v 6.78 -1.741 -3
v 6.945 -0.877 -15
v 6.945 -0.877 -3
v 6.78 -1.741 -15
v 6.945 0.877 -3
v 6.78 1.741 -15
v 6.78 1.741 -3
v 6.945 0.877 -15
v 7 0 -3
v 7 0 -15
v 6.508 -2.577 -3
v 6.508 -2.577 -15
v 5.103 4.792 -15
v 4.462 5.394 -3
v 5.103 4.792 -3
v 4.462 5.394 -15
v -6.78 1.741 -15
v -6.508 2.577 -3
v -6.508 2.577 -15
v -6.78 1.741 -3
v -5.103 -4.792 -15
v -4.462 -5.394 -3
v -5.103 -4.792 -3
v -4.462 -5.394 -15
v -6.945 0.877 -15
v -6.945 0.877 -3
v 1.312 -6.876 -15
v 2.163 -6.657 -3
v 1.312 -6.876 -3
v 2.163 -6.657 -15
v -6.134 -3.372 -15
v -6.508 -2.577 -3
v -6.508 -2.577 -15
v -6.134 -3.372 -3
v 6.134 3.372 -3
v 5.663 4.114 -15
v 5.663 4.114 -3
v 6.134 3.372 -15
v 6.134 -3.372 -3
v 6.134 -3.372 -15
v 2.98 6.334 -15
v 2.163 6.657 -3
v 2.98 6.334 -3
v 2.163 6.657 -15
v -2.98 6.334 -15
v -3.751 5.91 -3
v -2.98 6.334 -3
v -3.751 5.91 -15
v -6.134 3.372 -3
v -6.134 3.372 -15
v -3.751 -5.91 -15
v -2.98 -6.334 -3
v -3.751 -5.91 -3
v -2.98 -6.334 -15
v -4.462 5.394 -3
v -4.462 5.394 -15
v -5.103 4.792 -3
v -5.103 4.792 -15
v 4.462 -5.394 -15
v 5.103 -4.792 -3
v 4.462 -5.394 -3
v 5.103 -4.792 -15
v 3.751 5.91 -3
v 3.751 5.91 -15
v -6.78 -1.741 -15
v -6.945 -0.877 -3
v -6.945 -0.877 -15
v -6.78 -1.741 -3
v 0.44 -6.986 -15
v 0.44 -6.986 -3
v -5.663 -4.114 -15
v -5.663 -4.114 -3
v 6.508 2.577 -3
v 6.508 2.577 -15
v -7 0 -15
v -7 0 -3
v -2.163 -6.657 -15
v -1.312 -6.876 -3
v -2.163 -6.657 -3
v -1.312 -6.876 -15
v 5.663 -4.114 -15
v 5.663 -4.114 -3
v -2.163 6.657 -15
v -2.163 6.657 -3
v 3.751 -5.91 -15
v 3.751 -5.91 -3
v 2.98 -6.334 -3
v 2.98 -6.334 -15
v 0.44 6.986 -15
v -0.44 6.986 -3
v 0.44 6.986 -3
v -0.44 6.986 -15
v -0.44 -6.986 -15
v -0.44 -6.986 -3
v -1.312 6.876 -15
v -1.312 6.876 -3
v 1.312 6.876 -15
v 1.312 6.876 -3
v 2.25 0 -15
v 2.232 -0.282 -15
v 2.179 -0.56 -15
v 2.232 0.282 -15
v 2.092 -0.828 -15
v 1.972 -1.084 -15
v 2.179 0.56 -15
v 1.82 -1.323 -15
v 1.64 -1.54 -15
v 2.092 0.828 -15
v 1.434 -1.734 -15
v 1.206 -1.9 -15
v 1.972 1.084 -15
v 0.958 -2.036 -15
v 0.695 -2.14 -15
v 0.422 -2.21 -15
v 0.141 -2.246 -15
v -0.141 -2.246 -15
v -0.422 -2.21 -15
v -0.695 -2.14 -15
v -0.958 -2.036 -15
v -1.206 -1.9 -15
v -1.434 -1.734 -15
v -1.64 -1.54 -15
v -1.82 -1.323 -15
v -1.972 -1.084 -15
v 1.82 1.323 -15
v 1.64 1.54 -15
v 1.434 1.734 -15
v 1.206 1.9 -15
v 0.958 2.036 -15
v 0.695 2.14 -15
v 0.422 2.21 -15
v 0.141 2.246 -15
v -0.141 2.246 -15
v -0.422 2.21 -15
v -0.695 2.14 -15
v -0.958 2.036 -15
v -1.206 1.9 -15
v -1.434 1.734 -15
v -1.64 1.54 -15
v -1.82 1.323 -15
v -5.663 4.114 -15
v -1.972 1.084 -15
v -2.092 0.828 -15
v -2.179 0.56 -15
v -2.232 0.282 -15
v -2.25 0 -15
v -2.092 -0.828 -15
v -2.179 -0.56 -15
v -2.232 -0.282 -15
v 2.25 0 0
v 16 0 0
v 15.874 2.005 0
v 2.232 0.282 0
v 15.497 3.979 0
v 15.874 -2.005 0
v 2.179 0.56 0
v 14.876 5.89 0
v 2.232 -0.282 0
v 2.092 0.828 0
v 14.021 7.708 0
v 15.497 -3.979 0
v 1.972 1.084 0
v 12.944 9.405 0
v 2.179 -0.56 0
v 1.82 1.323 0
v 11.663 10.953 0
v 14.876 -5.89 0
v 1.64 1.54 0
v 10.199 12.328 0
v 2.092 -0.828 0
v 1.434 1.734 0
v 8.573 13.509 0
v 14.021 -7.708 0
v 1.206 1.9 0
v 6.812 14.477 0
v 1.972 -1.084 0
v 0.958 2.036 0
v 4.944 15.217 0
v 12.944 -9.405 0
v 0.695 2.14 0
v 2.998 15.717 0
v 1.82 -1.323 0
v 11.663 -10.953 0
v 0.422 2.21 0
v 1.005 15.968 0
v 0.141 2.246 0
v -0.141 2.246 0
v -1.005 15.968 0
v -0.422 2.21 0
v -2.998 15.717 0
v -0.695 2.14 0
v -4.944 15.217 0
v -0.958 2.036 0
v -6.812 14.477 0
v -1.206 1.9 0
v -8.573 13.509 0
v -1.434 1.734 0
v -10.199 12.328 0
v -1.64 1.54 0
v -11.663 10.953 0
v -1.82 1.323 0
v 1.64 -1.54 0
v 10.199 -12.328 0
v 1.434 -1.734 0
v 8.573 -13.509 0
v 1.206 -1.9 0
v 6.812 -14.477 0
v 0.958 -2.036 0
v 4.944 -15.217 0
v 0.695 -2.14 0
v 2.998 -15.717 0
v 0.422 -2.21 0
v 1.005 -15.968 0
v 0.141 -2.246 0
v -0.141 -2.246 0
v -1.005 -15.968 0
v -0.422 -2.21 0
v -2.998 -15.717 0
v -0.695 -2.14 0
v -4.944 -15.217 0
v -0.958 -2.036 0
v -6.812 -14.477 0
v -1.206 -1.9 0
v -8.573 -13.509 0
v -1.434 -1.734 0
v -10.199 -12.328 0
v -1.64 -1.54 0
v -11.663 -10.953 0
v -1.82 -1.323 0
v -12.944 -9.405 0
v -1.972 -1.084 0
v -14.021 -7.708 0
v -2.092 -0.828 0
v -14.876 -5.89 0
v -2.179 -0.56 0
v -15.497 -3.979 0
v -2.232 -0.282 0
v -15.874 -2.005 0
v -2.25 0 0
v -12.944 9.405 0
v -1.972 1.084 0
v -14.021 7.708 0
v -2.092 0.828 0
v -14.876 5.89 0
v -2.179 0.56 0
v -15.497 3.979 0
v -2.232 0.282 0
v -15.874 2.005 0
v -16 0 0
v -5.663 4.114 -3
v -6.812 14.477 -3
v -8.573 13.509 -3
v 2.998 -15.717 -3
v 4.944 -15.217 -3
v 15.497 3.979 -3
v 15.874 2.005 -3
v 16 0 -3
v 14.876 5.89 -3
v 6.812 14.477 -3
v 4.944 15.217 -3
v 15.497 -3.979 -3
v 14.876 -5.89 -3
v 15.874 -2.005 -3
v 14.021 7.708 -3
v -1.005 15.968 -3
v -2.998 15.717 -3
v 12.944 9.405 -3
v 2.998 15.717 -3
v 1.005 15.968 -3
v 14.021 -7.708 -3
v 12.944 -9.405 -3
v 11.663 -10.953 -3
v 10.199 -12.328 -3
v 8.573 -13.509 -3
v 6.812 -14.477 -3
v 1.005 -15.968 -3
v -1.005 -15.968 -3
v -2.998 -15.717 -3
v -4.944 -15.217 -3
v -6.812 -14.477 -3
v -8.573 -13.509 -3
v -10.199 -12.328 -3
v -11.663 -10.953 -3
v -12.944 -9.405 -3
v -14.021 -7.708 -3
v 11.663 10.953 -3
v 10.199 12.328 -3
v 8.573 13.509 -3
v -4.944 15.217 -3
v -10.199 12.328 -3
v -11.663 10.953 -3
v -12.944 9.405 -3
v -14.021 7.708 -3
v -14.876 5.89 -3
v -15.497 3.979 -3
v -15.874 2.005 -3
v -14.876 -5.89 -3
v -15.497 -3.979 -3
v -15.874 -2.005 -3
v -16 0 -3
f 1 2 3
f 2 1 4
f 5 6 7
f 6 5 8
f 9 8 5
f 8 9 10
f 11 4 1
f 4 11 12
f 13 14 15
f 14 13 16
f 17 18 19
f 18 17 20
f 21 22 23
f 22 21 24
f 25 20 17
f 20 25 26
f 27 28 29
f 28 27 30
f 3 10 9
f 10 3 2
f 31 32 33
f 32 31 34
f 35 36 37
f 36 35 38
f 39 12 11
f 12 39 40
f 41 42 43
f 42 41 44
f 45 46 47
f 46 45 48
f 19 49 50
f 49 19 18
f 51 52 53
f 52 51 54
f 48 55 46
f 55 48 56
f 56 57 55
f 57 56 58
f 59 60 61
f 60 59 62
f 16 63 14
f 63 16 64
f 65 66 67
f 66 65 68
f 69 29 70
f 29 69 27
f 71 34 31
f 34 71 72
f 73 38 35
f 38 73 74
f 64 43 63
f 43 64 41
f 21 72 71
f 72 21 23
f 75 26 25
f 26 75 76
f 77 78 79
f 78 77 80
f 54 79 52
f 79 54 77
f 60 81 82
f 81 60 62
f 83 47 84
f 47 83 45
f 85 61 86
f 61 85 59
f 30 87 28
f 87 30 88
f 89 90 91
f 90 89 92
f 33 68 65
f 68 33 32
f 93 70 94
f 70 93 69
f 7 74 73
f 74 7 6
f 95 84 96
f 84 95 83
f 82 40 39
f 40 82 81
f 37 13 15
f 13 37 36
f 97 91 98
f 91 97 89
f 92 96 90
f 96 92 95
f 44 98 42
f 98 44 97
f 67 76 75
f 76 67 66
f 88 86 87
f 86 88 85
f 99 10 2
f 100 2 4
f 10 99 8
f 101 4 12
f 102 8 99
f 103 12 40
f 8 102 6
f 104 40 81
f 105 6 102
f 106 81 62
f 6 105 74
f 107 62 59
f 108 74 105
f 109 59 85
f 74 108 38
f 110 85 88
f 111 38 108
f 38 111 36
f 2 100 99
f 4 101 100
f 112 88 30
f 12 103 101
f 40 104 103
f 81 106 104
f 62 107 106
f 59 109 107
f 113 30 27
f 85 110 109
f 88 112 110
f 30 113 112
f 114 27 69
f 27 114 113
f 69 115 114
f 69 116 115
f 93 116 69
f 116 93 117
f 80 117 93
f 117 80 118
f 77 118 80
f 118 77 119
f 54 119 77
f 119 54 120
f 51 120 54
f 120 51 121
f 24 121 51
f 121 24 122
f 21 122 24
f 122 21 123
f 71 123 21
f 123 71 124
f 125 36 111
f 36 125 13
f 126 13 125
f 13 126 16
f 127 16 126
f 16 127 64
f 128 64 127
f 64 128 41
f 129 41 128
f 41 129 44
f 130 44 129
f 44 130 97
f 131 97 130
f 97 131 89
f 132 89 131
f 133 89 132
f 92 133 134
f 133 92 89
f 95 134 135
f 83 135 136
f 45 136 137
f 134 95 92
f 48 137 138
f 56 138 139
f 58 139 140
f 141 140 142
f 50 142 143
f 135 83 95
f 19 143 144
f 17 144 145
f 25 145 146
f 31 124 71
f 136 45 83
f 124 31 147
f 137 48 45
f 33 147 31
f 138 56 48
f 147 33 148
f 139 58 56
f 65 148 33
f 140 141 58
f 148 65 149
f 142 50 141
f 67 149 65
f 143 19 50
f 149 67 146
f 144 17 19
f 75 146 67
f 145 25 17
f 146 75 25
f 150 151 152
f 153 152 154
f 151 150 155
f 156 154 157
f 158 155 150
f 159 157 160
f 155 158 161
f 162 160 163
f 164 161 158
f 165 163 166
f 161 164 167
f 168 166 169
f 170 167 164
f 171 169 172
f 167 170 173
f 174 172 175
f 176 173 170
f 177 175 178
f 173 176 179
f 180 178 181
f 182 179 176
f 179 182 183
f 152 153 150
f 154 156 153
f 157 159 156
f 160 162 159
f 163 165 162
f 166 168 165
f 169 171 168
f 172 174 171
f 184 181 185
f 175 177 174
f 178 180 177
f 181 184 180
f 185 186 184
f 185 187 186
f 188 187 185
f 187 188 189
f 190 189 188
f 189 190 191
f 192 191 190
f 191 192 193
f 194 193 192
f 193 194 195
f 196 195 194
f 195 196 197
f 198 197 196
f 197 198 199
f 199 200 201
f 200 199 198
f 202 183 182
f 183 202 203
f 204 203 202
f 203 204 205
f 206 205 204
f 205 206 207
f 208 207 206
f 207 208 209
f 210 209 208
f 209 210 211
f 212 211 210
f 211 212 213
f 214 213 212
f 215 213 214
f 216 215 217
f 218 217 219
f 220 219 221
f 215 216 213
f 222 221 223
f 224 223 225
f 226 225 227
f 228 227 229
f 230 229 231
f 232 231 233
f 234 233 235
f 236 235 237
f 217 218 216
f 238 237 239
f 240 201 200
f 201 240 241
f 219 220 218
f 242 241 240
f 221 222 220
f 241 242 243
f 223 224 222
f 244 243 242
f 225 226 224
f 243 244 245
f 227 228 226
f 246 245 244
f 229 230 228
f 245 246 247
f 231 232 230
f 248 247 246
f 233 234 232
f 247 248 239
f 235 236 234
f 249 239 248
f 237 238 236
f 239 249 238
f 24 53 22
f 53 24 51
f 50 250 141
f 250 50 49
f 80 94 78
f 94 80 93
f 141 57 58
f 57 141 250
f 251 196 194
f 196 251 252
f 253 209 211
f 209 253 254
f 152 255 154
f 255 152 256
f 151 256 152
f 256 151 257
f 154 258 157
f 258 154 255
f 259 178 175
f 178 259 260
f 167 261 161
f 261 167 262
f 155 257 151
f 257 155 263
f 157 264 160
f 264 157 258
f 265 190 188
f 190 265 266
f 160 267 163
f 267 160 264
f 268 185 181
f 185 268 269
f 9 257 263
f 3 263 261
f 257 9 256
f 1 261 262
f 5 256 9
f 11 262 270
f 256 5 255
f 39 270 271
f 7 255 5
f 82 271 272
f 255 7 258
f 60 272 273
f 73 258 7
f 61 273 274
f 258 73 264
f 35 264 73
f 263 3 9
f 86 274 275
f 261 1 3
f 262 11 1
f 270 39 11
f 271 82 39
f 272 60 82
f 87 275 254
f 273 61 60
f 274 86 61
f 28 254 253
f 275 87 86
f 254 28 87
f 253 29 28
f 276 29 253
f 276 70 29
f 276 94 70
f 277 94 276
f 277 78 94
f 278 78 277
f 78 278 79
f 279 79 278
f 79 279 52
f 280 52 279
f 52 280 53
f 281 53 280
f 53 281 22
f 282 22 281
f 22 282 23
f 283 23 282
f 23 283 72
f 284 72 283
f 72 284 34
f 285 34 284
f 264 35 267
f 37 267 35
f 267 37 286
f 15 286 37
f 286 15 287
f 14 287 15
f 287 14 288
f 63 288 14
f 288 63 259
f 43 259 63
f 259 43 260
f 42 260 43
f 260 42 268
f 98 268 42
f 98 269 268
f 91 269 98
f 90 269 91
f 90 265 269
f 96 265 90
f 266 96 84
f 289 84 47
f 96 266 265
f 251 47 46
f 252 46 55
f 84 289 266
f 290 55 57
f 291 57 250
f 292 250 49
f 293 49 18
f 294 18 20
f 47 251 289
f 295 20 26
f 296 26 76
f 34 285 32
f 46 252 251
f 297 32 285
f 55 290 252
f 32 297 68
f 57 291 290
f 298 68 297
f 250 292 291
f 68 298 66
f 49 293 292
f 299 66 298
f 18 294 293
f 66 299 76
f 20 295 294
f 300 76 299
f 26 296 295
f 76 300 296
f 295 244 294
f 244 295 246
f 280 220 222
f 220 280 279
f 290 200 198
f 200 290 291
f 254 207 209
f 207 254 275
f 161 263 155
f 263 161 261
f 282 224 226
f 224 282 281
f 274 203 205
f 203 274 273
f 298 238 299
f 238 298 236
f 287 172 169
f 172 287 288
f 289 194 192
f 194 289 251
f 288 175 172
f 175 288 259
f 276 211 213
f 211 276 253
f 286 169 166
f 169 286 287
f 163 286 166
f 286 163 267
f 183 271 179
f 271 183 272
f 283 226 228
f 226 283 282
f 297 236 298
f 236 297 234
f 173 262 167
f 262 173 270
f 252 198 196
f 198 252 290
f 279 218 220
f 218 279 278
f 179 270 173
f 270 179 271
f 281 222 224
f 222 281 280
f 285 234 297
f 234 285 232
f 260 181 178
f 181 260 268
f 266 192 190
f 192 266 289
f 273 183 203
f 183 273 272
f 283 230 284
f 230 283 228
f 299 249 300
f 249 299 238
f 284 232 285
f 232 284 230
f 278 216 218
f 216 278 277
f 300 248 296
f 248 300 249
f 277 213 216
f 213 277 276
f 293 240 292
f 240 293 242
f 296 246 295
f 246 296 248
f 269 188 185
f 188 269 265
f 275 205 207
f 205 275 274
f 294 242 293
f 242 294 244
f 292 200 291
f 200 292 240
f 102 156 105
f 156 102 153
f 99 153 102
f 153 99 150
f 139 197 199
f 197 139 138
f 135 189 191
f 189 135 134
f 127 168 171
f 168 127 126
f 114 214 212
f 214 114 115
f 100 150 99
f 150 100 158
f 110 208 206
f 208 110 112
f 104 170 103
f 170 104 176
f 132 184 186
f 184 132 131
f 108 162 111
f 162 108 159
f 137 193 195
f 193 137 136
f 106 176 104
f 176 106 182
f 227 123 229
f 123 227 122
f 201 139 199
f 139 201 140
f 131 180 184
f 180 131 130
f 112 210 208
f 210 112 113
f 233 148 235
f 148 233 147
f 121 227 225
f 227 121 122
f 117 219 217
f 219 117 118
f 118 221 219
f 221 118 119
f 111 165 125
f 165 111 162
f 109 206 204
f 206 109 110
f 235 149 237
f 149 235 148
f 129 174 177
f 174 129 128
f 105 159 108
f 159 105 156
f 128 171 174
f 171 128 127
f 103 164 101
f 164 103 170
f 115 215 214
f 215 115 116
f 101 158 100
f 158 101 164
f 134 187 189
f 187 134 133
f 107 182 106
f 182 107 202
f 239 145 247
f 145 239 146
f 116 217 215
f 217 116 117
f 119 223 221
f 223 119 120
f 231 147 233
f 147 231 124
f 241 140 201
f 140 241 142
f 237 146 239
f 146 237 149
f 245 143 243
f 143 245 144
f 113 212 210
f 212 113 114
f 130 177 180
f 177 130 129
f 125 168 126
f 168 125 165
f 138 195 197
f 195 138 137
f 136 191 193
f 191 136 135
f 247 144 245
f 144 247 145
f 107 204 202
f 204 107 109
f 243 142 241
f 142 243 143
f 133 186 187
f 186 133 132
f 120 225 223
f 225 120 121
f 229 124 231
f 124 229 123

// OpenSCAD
$fn = 50;


difference() {
	union() {
		translate(v = [0, 0, -15.0000000000]) {
			cylinder(h = 15, r = 7.0000000000);
		}
		translate(v = [0, 0, -3.0000000000]) {
			cylinder(h = 3, r = 16.0000000000);
		}
	}
	union() {
		#translate(v = [0, 0, -15]) {
			cylinder(h = 15, r = 2.2500000000);
		}
	}
}
